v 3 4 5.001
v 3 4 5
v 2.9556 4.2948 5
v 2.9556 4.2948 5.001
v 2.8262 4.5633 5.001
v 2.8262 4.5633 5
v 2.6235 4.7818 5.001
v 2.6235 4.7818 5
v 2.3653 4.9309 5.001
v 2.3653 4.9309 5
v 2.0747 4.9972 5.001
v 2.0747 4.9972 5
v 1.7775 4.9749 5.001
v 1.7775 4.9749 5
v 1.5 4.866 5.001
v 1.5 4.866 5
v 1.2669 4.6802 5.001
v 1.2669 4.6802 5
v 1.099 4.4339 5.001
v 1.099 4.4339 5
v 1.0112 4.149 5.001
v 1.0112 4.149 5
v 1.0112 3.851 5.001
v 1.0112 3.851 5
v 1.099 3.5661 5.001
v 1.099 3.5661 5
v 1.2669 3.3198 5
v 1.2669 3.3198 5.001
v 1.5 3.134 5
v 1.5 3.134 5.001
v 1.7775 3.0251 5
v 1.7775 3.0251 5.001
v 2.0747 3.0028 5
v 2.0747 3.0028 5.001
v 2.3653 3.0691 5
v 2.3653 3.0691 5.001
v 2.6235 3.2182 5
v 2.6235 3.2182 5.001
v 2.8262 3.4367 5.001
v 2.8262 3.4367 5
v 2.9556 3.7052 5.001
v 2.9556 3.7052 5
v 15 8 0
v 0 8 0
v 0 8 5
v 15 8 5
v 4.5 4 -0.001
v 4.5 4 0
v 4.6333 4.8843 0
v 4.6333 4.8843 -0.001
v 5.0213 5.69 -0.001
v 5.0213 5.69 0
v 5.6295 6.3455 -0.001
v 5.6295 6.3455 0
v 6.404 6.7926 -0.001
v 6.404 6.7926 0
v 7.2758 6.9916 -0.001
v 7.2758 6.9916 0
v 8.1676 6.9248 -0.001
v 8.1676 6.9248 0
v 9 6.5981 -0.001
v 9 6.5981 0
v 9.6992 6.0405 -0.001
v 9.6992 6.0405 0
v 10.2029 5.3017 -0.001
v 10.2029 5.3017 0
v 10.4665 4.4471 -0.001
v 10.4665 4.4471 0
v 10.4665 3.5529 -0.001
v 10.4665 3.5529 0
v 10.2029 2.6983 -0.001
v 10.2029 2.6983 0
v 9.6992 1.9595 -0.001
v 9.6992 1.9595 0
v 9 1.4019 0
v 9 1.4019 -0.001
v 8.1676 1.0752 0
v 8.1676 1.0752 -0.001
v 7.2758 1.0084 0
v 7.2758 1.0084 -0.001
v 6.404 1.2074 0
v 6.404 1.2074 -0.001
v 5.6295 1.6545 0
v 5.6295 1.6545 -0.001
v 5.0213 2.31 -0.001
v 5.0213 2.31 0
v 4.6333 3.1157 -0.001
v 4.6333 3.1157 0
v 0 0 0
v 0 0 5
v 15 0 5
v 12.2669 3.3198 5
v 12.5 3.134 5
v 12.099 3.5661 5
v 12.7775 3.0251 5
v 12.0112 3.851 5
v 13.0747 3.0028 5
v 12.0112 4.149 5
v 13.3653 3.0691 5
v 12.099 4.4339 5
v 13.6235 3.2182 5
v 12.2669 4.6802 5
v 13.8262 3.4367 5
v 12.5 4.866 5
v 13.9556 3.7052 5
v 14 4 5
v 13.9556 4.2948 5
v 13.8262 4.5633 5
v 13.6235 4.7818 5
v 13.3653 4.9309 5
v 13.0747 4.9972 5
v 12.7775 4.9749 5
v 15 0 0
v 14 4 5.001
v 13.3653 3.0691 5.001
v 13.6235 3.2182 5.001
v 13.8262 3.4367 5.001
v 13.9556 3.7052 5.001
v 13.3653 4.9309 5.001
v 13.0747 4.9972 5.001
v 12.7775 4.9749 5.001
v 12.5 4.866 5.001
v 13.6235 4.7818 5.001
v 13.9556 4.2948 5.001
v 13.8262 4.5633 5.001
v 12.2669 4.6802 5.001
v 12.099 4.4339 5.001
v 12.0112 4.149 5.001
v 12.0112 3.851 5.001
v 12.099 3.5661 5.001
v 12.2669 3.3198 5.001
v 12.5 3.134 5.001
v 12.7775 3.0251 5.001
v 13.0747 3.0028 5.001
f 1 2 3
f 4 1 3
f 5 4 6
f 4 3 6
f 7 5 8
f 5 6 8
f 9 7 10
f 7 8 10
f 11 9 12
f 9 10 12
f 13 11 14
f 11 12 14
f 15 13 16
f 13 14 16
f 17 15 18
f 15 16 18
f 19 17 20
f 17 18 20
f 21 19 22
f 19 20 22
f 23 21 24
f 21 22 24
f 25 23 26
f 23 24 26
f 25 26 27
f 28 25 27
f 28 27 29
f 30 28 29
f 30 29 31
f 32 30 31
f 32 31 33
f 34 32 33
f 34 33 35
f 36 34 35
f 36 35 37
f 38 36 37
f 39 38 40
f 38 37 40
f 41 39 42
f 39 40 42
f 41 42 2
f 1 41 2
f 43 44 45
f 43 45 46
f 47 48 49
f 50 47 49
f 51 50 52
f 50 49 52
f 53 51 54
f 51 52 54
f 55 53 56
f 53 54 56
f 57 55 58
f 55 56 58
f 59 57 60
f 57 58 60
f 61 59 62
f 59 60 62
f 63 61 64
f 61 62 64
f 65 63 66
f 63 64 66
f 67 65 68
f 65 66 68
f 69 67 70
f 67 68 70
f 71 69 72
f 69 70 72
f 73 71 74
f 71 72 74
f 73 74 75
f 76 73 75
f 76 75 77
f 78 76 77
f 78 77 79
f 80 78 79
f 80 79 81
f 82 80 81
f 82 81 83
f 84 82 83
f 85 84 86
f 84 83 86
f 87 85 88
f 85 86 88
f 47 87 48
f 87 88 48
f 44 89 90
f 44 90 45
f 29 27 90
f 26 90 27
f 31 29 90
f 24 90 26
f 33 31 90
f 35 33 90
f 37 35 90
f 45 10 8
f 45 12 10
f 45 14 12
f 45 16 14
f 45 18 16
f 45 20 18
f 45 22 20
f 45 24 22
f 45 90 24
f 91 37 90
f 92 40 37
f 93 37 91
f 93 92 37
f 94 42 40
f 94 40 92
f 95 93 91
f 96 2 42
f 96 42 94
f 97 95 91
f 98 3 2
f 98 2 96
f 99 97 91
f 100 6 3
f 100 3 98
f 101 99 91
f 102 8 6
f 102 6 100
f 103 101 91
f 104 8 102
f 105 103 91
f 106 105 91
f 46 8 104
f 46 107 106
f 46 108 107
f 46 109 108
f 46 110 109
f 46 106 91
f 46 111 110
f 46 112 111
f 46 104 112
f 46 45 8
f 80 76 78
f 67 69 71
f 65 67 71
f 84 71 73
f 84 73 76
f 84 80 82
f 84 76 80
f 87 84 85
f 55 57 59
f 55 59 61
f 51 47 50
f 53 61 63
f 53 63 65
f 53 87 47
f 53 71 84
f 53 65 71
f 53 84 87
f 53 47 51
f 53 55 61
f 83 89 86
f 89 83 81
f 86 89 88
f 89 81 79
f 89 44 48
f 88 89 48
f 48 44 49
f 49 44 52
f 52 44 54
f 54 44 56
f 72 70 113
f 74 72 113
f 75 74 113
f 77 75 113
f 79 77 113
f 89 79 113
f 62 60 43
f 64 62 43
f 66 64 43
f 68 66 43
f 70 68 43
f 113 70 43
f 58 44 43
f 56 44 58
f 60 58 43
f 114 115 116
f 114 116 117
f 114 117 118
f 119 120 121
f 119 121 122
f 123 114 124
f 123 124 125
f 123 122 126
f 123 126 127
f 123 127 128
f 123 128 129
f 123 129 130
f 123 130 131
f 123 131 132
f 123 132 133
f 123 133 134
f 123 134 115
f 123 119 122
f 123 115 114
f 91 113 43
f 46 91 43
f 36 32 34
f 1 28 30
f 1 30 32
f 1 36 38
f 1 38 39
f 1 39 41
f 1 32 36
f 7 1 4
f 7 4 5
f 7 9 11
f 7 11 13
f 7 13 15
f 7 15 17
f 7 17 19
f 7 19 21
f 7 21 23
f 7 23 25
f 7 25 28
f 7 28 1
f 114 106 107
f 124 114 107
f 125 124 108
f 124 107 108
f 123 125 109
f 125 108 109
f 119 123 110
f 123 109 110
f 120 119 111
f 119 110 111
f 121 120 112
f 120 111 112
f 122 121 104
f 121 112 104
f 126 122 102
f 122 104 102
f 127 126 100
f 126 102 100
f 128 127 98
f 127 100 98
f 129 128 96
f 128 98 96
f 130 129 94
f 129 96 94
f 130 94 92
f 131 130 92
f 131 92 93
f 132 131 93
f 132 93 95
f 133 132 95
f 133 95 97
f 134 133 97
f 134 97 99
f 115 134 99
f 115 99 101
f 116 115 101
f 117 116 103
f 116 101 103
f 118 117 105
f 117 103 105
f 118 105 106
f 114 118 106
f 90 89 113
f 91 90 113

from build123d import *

# Parameters (mm, degrees)
SKETCH1_W           = 15
SKETCH1_H           = 8
BOSS_EXTRUDE1_DEPTH = 5
SKETCH2_R           = 3
BOSS_EXTRUDE2_DEPTH = 0.001
SKETCH3_R           = 1
BOSS_EXTRUDE3_DEPTH = 0.001


with BuildPart() as part:
    # Sketch1 → Boss-Extrude1 (new body)
    with BuildSketch(Plane.XY):
        with Locations((7.5, 4)):
            Rectangle(SKETCH1_W, SKETCH1_H)
    extrude(amount=BOSS_EXTRUDE1_DEPTH)

    # Sketch2 → Boss-Extrude2 (add)
    with BuildSketch(Plane(origin=(0, 0, 0), x_dir=(-1, 0, 0), z_dir=(0, 0, -1))):
        with Locations((-7.5, 4)):
            Circle(SKETCH2_R)
    extrude(amount=BOSS_EXTRUDE2_DEPTH)

    # Sketch3 → Boss-Extrude3 (add)
    with BuildSketch(Plane.XY.offset(5)):
        with Locations((13, 4)):
            Circle(SKETCH3_R)
        with Locations((2, 4)):
            Circle(SKETCH3_R)
    extrude(amount=BOSS_EXTRUDE3_DEPTH)


solid = part.part
